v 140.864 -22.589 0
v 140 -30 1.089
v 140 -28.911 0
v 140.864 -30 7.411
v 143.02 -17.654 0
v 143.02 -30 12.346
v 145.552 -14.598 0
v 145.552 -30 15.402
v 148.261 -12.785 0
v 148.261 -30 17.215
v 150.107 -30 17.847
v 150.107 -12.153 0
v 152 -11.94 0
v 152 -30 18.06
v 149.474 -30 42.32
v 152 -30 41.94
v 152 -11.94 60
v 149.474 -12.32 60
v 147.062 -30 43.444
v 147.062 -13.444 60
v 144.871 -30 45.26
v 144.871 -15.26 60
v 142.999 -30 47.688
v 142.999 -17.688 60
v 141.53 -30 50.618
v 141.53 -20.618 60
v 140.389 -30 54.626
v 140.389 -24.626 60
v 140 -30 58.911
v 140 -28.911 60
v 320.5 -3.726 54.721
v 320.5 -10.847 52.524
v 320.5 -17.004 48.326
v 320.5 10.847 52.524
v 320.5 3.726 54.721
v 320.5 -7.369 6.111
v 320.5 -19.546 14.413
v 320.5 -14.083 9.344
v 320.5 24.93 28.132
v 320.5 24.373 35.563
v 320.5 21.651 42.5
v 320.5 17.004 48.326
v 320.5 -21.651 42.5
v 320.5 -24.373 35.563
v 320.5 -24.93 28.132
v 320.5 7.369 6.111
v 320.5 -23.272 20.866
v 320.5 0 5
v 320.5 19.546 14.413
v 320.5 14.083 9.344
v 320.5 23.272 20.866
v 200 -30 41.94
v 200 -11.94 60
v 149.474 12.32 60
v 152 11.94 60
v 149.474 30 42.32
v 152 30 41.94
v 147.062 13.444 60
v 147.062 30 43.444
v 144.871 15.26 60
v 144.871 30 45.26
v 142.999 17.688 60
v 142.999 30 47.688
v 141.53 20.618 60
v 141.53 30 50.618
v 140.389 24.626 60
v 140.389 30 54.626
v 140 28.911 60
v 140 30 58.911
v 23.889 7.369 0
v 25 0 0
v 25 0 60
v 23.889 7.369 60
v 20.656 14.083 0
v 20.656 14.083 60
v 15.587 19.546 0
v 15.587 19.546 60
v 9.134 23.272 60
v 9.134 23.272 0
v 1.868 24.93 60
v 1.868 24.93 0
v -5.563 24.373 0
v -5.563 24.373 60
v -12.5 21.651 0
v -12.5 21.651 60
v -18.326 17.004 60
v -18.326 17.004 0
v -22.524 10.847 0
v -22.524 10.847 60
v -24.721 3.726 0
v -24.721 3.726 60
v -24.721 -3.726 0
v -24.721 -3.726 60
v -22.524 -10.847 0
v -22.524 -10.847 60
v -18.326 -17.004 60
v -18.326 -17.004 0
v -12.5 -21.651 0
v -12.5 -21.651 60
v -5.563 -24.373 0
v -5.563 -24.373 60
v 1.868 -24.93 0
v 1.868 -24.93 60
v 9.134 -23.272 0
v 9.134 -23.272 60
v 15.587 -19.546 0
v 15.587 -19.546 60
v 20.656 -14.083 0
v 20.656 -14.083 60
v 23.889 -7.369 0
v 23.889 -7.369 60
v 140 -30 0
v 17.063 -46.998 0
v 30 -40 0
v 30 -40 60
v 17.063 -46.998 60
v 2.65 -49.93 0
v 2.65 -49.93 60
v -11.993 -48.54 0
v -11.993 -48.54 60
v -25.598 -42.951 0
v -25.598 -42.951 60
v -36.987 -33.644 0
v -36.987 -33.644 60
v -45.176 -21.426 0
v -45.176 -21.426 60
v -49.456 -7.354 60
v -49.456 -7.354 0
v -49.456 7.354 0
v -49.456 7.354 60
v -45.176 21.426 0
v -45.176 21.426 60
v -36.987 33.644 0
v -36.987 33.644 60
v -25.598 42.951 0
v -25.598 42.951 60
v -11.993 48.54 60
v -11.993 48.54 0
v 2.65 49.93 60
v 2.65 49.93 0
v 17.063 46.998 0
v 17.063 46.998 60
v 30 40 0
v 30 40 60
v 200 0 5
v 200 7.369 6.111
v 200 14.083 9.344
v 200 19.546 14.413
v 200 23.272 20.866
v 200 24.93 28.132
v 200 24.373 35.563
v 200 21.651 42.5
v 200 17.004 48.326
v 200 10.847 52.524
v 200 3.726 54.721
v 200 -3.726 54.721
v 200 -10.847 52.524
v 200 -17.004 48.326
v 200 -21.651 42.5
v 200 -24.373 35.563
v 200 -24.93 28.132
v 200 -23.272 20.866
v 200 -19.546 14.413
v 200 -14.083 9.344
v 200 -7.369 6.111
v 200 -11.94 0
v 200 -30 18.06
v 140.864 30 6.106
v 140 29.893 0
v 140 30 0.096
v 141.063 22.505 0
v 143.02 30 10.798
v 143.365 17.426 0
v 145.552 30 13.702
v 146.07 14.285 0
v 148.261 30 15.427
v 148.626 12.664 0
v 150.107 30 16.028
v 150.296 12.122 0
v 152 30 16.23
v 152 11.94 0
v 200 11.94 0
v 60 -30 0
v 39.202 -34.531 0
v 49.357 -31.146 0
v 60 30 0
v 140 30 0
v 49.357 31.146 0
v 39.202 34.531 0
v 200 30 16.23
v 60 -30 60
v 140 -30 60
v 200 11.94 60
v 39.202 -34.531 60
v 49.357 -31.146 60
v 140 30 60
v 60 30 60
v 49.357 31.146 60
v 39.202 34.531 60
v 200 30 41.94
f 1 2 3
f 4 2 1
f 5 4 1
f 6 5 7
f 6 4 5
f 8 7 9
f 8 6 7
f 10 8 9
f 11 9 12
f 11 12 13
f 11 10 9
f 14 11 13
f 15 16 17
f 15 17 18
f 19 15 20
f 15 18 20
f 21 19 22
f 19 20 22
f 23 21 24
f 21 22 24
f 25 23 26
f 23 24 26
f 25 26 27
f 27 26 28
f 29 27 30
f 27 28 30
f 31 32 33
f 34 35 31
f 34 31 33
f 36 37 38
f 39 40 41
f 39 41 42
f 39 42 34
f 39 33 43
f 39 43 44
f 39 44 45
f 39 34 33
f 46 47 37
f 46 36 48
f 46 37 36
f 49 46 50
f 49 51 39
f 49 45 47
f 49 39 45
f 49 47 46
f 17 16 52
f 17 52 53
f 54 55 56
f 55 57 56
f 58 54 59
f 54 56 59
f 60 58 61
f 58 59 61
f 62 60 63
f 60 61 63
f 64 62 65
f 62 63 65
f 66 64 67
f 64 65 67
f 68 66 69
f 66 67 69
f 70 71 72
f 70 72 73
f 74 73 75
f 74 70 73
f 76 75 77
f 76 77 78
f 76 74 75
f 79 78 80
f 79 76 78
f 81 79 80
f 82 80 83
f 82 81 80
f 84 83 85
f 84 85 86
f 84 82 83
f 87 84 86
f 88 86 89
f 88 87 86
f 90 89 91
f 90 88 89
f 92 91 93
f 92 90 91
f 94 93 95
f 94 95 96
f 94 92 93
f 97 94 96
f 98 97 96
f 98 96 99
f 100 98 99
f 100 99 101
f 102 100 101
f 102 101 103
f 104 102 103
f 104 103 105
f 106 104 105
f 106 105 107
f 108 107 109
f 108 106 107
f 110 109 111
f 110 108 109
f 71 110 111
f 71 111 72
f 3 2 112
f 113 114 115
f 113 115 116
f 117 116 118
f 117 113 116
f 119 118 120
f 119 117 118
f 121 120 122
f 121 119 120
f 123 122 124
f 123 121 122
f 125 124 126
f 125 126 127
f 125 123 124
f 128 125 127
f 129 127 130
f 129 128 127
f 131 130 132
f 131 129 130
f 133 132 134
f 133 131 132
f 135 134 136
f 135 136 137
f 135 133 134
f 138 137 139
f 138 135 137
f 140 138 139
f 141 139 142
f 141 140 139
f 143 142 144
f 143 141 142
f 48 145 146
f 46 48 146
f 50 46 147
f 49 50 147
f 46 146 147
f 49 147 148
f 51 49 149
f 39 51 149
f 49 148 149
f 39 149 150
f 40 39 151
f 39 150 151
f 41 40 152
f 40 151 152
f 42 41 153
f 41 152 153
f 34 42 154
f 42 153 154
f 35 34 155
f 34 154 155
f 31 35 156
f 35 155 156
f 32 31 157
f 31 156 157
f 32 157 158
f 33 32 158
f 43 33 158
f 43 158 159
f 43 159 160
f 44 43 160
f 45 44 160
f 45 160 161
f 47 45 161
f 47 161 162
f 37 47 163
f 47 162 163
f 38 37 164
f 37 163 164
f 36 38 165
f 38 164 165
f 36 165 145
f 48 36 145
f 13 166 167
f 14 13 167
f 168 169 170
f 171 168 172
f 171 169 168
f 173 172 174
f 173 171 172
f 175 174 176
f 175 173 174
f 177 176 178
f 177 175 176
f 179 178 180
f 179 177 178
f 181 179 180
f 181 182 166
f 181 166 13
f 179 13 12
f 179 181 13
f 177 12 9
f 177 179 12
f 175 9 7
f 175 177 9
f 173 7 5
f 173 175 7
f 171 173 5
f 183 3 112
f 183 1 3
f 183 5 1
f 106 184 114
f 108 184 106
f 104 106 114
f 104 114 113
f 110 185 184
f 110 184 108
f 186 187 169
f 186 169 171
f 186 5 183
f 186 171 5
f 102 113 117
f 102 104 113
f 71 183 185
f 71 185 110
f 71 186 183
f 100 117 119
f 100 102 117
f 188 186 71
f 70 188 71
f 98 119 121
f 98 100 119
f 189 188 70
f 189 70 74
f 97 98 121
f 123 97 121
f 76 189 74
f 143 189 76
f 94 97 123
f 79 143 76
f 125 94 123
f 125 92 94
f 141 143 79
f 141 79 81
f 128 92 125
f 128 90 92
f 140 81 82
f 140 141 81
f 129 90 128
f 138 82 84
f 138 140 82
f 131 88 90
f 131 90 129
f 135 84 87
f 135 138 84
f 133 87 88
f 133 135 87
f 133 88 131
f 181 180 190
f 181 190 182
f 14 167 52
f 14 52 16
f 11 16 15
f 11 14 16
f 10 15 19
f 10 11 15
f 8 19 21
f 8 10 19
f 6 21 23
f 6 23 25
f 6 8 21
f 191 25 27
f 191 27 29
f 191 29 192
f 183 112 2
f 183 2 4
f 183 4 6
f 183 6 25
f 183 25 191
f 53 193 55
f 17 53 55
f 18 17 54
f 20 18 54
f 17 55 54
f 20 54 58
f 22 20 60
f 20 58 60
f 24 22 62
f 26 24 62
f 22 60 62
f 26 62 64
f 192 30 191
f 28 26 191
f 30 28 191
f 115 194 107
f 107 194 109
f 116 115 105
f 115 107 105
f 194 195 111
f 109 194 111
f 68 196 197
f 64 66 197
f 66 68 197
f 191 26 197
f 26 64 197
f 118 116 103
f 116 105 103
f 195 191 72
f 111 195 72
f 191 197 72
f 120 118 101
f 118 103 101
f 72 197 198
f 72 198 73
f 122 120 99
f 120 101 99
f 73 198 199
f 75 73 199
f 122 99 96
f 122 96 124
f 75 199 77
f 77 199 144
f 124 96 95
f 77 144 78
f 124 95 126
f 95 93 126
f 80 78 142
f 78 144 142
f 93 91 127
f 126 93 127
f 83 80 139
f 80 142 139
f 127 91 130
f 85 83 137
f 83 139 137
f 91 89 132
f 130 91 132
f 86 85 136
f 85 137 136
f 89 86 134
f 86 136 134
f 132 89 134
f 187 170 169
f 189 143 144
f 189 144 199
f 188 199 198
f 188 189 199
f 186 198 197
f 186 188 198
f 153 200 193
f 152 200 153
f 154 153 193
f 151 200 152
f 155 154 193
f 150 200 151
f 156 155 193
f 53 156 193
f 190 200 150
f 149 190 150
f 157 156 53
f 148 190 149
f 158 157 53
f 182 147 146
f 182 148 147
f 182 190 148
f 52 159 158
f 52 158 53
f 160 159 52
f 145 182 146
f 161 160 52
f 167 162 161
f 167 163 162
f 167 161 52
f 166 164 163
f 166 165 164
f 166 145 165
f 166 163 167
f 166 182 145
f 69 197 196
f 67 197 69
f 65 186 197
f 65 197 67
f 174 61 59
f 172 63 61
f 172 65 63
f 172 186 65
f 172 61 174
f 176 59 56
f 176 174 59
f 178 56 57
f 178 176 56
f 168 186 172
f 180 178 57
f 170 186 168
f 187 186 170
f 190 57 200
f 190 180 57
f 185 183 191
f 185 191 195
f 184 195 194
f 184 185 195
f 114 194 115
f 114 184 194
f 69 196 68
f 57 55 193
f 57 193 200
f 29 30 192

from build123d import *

# Parameters (mm, degrees)
SKETCH1_R           = 25
BOSS_EXTRUDE1_DEPTH = 60
SKETCH2_R           = 25
BOSS_EXTRUDE2_DEPTH = 120.5
CUT_EXTRUDE5_DEPTH  = 60
FILLET1_R           = 12


with BuildPart() as part:
    # Sketch1 → Boss-Extrude1 (new body)
    with BuildSketch(Plane.XY):
        with BuildLine():
            Line((60, 30), (200, 30))
            Line((200, 30), (200, -30))
            Line((200, -30), (60, -30))
            ThreePointArc((60, -30), (44.188611699, -32.565835097), (30, -40))
            ThreePointArc((30, -40), (-50, 0), (30, 40))
            ThreePointArc((30, 40), (44.188611699, 32.565835097), (60, 30))
        make_face()
        Circle(SKETCH1_R, mode=Mode.SUBTRACT)
    extrude(amount=BOSS_EXTRUDE1_DEPTH)

    # Sketch2 → Boss-Extrude2 (add)
    with BuildSketch(Plane(origin=(200, 0, 0), x_dir=(0, 0, -1), z_dir=(1, 0, 0))):
        with Locations((-30, 0)):
            Circle(SKETCH2_R)
    extrude(amount=BOSS_EXTRUDE2_DEPTH)

    # Sketch8 → Cut-Extrude5 (cut)
    with BuildSketch(Plane(origin=(200, 0, 0), x_dir=(0, 0, -1), z_dir=(1, 0, 0))):
        Polygon((-60, 11.94), (-41.94, 30), (-60, 30), align=None)
        Polygon((0, 30), (-16.229667357, 30), (0, 11.94), align=None)
        Polygon((-41.94, -30), (-60, -11.94), (-60, -30), align=None)
        Polygon((0, -30), (0, -11.94), (-18.06, -30), align=None)
    extrude(amount=-CUT_EXTRUDE5_DEPTH, mode=Mode.SUBTRACT)

    # Fillet1
    fillet1_edges = [part.edges().sort_by_distance(p)[0] for p in [
        (140, -20.97, 50.97),
        (140, -20.97, 9.03),
        (140, 20.97, 8.114833678),
        (140, 20.97, 50.97),
    ]]
    fillet(fillet1_edges, radius=FILLET1_R)


solid = part.part
